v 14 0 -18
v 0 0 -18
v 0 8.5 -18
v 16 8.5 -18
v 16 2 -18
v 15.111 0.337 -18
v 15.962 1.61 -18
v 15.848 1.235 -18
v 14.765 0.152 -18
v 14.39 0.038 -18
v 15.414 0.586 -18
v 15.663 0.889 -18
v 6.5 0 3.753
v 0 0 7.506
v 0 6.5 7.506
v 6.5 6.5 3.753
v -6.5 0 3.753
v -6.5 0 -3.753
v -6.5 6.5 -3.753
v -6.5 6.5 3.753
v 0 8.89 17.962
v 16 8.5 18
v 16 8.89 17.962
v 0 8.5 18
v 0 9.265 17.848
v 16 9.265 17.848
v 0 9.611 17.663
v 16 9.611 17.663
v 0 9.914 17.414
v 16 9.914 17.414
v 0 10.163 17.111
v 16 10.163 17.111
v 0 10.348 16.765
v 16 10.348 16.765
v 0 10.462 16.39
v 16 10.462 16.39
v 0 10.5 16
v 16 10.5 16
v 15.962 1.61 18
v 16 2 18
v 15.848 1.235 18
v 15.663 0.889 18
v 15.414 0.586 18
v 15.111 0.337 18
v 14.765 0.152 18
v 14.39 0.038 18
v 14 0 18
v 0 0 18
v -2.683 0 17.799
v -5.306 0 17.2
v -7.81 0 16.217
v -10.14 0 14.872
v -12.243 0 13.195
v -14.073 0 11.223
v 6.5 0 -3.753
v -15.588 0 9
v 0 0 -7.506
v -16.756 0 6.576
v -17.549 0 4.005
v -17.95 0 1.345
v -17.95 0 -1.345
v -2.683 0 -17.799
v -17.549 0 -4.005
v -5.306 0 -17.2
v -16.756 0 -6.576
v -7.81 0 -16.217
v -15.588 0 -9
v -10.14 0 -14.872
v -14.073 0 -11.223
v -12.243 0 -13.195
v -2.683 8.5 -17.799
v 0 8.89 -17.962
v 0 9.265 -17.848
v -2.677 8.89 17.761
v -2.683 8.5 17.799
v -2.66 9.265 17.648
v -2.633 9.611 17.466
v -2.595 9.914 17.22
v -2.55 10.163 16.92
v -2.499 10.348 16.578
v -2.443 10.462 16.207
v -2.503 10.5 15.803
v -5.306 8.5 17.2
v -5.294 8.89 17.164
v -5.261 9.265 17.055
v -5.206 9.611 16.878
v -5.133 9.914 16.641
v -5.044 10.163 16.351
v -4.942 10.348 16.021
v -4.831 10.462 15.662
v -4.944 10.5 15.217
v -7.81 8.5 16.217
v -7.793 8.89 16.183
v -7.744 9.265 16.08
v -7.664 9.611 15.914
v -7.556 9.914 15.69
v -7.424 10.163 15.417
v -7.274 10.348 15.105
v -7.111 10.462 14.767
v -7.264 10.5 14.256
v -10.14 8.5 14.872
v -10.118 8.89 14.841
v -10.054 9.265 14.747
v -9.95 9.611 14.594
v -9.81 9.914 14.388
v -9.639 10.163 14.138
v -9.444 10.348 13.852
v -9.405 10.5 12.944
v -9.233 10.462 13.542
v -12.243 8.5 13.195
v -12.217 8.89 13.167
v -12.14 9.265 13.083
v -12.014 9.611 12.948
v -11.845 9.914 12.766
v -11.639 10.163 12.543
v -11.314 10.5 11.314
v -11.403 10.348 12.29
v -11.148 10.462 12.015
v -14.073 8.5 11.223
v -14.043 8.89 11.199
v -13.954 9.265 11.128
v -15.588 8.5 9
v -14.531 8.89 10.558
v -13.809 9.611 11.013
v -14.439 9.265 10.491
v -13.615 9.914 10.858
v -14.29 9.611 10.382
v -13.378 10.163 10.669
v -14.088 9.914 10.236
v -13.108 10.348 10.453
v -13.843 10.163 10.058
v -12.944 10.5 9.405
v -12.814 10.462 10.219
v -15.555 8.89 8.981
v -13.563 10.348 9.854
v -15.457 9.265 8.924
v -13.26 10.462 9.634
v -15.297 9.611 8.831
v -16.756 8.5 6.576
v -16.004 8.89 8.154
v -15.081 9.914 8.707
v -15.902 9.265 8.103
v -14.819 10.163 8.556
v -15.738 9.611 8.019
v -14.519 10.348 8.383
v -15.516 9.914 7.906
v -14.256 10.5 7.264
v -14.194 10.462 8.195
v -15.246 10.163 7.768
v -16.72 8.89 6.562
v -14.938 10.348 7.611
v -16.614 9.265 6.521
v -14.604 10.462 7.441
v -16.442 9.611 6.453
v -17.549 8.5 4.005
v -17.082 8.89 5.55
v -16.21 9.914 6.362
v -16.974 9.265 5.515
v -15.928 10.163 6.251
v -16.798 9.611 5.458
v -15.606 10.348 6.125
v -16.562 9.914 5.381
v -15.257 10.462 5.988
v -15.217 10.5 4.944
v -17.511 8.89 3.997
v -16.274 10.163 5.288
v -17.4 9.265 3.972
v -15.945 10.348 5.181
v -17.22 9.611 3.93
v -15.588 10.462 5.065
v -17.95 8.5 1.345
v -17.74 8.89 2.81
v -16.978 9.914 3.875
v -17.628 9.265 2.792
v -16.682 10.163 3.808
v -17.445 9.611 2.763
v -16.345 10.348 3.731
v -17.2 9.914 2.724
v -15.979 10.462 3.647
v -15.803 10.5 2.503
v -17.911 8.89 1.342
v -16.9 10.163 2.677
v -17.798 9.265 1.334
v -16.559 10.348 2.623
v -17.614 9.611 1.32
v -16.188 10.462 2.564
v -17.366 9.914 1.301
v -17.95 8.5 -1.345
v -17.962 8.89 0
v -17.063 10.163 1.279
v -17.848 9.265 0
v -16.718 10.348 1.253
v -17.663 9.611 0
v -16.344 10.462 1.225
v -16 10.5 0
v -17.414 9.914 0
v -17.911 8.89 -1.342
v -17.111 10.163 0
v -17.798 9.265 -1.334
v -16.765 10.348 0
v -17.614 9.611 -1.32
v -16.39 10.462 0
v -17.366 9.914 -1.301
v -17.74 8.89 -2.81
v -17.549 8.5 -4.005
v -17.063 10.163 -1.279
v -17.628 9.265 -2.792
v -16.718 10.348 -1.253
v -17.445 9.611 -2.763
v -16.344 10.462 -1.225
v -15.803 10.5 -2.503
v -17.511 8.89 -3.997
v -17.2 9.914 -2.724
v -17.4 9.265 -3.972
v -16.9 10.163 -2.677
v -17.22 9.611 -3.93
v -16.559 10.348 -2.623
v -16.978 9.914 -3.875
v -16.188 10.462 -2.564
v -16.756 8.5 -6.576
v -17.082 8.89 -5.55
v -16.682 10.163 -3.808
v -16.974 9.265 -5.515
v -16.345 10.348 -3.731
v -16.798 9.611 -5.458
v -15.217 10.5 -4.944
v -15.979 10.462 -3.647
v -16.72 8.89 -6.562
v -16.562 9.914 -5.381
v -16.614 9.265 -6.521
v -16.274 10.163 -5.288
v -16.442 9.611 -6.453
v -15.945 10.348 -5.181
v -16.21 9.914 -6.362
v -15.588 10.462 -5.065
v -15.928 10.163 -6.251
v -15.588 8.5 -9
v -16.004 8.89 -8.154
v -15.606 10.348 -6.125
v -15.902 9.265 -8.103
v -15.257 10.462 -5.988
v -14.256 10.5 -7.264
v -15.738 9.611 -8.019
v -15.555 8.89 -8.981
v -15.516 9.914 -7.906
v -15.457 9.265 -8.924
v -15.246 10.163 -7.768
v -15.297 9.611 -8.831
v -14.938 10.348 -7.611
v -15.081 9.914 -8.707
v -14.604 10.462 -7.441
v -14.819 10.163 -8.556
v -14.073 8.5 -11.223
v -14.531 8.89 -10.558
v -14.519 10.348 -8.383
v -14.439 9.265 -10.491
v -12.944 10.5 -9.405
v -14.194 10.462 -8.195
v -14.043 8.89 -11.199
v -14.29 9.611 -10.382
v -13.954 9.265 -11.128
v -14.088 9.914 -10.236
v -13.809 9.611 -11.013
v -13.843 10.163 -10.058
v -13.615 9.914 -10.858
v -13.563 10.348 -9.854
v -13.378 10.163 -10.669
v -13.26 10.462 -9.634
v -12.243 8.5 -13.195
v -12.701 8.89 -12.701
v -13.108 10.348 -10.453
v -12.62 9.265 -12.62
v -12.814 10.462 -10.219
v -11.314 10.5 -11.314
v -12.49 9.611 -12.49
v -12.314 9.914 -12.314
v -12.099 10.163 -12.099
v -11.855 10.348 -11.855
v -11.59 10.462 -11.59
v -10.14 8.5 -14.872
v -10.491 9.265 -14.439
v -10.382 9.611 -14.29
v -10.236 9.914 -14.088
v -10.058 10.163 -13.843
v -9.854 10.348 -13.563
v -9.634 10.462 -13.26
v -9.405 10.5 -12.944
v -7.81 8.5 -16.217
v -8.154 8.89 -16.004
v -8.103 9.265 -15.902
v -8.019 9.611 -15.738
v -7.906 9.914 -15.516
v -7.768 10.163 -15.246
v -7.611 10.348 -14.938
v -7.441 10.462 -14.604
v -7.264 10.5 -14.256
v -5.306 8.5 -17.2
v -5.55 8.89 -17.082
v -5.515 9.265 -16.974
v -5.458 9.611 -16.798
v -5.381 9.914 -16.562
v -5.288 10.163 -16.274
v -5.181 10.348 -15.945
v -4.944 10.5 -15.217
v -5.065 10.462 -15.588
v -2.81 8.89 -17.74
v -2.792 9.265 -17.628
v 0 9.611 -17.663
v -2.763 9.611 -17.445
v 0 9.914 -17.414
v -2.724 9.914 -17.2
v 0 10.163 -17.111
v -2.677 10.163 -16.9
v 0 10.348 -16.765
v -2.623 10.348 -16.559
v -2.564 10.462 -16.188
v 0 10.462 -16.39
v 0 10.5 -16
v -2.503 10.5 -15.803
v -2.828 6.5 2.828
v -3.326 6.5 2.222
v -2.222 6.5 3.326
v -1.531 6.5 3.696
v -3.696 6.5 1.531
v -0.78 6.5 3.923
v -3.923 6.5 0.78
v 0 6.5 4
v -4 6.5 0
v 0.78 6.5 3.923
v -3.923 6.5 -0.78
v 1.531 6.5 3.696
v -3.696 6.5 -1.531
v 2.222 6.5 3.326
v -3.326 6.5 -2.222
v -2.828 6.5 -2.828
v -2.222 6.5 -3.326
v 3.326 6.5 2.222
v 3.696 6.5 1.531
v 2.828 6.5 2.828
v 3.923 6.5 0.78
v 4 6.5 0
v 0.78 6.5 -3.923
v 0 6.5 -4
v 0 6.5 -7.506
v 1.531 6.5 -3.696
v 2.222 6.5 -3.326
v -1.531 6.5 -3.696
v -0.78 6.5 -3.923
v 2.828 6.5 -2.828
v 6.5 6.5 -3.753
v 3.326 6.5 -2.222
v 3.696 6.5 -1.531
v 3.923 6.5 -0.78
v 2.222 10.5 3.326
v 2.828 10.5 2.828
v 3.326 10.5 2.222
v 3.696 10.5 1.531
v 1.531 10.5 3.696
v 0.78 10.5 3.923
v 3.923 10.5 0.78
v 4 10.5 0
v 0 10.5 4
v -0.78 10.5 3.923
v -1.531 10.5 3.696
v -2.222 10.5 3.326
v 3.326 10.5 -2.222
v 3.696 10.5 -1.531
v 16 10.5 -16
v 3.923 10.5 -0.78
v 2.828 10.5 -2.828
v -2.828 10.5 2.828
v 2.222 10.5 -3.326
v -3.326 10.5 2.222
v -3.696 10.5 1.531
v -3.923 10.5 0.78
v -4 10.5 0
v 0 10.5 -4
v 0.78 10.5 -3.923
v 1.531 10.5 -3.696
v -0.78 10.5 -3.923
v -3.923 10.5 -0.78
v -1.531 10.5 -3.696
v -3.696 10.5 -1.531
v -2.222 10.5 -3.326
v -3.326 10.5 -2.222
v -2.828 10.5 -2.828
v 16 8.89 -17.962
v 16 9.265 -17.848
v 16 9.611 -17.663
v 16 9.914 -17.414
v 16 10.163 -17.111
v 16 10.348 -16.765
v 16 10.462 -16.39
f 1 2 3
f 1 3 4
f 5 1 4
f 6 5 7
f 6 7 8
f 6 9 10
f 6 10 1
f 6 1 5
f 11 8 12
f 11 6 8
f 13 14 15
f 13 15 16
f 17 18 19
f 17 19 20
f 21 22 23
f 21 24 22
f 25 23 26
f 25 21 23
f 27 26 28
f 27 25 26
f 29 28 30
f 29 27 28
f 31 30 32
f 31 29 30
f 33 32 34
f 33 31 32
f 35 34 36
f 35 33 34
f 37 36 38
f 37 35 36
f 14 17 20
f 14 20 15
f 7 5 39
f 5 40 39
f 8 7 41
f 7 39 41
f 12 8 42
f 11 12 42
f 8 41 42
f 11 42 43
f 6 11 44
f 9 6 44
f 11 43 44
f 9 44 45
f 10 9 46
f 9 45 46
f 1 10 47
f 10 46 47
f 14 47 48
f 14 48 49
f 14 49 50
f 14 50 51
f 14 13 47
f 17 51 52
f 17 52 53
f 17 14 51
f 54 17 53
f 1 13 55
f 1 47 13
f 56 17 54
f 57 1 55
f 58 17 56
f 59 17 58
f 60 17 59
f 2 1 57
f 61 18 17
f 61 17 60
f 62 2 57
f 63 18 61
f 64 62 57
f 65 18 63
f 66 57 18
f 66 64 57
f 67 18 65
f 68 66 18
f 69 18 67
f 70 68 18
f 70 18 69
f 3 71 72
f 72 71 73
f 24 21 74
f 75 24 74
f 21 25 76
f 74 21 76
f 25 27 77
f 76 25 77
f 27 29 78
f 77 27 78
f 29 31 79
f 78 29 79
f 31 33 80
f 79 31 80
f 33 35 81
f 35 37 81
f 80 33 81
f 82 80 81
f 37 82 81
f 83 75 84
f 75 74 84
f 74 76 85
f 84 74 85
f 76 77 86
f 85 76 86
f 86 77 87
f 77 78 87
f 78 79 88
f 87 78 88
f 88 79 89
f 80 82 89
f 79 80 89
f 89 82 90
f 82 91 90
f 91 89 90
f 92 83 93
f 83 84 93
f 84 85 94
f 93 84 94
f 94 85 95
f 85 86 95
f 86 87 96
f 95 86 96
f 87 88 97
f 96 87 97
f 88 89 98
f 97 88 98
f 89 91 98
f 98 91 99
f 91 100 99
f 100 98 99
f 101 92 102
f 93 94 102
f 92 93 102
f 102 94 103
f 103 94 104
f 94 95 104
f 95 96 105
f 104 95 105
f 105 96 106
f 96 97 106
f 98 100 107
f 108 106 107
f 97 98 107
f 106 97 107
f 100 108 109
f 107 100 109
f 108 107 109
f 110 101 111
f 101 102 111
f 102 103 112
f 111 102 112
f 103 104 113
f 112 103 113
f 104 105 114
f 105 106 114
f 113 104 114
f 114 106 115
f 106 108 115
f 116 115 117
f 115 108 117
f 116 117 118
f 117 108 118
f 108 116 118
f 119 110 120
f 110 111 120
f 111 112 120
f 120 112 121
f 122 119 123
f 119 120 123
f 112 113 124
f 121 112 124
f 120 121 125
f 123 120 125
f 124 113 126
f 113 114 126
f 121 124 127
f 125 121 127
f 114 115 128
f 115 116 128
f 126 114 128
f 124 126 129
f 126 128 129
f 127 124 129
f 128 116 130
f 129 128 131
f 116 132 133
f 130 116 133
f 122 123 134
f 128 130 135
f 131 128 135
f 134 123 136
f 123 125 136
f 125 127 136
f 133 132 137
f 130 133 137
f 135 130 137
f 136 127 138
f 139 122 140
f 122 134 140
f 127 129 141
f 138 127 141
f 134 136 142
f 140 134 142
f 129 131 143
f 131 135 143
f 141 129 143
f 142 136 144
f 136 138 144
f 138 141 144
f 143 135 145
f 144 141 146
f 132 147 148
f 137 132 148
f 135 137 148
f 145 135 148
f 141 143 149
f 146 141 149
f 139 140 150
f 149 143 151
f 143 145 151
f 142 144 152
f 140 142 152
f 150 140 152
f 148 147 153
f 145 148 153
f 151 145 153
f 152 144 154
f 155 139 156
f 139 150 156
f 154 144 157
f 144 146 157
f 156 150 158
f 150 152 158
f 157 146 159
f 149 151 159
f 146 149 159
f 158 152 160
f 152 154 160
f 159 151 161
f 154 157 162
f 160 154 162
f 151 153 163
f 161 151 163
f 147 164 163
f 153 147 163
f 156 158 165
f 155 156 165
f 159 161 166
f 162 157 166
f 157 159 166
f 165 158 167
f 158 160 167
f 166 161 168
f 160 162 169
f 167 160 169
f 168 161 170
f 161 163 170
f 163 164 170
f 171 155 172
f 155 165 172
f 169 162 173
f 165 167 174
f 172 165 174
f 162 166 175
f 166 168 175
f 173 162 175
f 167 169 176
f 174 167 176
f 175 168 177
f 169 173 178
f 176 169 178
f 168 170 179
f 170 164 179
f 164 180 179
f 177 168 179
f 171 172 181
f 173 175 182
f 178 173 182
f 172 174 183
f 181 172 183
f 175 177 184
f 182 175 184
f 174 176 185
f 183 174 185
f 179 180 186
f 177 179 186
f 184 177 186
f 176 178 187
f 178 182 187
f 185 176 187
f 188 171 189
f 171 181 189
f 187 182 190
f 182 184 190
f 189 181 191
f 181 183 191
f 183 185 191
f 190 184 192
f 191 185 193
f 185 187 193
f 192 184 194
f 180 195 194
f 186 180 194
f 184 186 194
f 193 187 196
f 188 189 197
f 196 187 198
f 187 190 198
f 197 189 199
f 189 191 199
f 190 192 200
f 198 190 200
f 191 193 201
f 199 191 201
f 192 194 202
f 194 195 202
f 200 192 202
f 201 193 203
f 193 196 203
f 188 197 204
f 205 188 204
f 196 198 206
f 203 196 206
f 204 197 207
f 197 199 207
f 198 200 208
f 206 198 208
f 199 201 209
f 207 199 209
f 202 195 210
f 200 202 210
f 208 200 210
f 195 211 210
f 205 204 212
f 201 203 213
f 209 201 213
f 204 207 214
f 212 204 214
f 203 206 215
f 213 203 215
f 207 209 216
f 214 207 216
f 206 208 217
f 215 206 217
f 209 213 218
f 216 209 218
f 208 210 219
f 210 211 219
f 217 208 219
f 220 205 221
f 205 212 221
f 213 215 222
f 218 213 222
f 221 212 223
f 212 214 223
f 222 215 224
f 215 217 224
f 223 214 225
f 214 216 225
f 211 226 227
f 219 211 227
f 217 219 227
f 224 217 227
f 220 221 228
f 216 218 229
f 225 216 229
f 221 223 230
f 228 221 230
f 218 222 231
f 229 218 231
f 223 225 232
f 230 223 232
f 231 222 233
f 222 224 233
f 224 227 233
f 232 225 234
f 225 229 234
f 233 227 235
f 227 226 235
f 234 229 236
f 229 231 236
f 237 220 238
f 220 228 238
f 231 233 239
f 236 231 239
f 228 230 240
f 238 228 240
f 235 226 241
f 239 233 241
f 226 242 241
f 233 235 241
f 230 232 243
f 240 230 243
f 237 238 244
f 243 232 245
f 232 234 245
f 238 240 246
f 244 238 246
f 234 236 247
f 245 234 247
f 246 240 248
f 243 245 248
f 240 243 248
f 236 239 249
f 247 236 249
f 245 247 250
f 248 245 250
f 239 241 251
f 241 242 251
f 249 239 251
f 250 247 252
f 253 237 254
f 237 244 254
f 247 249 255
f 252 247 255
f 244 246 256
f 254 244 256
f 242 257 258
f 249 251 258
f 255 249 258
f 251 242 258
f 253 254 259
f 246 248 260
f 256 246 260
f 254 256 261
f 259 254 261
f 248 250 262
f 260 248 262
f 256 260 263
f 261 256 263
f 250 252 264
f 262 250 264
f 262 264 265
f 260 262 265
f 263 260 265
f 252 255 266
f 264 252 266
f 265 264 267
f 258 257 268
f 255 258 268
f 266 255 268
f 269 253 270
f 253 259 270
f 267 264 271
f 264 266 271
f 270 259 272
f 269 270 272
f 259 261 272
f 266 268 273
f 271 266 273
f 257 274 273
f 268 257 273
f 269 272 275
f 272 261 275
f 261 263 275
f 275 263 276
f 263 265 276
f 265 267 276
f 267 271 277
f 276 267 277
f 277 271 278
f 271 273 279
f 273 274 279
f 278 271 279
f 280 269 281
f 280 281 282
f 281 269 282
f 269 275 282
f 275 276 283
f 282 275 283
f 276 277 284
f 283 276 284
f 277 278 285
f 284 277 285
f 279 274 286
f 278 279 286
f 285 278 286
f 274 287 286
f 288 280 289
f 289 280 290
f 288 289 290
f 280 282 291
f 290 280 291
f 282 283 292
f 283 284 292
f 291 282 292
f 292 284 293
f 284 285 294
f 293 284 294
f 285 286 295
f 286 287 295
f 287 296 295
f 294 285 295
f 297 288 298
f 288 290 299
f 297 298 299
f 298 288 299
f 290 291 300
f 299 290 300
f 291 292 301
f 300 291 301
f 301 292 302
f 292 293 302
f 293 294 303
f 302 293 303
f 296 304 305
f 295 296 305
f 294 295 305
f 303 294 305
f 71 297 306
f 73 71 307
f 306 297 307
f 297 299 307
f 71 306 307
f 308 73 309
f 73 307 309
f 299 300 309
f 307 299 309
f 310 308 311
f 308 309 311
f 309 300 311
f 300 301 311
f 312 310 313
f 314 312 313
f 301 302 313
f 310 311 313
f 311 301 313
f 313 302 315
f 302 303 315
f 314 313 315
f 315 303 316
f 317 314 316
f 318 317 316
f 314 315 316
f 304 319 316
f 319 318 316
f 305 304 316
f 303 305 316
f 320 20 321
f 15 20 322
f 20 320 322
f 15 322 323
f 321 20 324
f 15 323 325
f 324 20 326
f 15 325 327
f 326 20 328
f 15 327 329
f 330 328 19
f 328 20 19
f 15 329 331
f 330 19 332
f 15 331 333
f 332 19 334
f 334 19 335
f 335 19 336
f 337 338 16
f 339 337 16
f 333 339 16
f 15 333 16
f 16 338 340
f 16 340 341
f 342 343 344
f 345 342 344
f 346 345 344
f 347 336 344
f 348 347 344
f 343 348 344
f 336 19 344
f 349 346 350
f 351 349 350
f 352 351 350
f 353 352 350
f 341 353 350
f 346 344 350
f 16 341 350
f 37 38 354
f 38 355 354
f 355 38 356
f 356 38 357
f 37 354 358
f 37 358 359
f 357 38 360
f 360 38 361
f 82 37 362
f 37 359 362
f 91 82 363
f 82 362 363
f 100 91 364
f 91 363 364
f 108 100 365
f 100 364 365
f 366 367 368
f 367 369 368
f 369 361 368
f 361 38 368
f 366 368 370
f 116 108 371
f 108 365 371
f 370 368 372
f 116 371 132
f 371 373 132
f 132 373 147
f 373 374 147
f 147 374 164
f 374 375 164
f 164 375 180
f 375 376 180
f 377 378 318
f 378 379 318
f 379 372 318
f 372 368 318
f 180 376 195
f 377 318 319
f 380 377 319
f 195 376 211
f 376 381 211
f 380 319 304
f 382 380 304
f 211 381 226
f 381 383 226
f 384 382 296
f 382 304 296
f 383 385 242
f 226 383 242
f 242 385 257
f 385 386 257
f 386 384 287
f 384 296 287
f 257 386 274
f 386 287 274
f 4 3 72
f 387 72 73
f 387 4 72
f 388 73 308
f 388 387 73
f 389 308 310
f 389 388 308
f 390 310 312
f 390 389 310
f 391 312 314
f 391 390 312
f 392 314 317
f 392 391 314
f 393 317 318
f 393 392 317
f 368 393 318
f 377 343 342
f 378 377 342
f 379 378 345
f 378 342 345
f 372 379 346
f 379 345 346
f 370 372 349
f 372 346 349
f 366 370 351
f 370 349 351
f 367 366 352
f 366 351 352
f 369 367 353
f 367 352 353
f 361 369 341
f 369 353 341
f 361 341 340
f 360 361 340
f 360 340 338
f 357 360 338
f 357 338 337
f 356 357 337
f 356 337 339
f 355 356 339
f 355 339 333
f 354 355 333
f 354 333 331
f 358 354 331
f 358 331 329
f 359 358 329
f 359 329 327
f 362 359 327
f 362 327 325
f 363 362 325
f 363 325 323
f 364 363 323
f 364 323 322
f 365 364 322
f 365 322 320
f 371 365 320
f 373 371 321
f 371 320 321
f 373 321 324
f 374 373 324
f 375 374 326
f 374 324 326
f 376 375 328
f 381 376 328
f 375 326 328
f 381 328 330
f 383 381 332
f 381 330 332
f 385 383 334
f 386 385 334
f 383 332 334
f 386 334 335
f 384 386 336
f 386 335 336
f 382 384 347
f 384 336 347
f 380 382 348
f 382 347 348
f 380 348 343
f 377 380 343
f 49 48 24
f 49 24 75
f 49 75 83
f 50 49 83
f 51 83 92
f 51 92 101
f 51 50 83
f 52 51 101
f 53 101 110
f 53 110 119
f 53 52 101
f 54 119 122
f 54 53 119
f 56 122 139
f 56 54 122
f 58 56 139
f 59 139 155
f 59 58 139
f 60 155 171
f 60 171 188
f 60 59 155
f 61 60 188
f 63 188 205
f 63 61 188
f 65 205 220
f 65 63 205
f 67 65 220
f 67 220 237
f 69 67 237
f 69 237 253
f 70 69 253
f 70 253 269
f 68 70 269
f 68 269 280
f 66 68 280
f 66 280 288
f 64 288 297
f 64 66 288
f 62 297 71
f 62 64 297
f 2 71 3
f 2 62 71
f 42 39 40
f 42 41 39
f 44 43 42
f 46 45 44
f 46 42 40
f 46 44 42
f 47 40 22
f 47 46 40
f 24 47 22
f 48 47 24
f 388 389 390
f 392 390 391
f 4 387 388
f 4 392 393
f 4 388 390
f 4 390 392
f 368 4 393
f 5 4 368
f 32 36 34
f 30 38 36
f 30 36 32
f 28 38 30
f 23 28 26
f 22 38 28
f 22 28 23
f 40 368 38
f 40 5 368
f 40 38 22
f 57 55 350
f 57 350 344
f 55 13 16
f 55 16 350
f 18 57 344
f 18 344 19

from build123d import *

# Parameters (mm, degrees)
BOSS_EXTRU_1_DEPTH      = 10.5
ENL_V_MAT_EXTRU_1_DEPTH = 6.5
ESQUISSE3_R             = 4
ENL_V_MAT_EXTRU_2_DEPTH = 27.272609311
CONG_1_R                = 2


with BuildPart() as part:
    # Esquisse1 → Boss.-Extru.1 (new body)
    with BuildSketch(Plane(origin=(0, 0, 0), x_dir=(1, 0, 0), z_dir=(0, 1, 0))):
        with BuildLine():
            Line((0, 18), (16, 18))
            Line((16, 18), (16, -18))
            Line((16, -18), (0, -18))
            ThreePointArc((0, -18), (-18, 0), (0, 18))
        make_face()
    extrude(amount=BOSS_EXTRU_1_DEPTH)

    # Esquisse2 → Enlèv. mat.-Extru.1 (cut)
    with BuildSketch(Plane(origin=(0, 0, 0), x_dir=(1, 0, 0), z_dir=(0, 1, 0))):
        Polygon((0, -7.505553499), (6.5, -3.75277675), (6.5, 3.75277675), (0, 7.505553499), (-6.5, 3.75277675), (-6.5, -3.75277675), align=None)
    extrude(amount=ENL_V_MAT_EXTRU_1_DEPTH, mode=Mode.SUBTRACT)

    # Esquisse3 → Enlèv. mat.-Extru.2 (cut, through all)
    with BuildSketch(Plane(origin=(0, 6.5, 0), x_dir=(-1, 0, 0), z_dir=(0, -1, 0))):
        with Locations(Location((0, 0, 0), (0, 0, 90))):
            Circle(ESQUISSE3_R)
    extrude(amount=-ENL_V_MAT_EXTRU_2_DEPTH, mode=Mode.SUBTRACT)

    # Congé1
    cong_1_edges = [part.edges().sort_by_distance(p)[0] for p in [
        (8, 10.5, -18),
        (-18, 10.5, 0),
        (16, 0, 0),
        (8, 10.5, 18),
    ]]
    fillet(cong_1_edges, radius=CONG_1_R)


solid = part.part
